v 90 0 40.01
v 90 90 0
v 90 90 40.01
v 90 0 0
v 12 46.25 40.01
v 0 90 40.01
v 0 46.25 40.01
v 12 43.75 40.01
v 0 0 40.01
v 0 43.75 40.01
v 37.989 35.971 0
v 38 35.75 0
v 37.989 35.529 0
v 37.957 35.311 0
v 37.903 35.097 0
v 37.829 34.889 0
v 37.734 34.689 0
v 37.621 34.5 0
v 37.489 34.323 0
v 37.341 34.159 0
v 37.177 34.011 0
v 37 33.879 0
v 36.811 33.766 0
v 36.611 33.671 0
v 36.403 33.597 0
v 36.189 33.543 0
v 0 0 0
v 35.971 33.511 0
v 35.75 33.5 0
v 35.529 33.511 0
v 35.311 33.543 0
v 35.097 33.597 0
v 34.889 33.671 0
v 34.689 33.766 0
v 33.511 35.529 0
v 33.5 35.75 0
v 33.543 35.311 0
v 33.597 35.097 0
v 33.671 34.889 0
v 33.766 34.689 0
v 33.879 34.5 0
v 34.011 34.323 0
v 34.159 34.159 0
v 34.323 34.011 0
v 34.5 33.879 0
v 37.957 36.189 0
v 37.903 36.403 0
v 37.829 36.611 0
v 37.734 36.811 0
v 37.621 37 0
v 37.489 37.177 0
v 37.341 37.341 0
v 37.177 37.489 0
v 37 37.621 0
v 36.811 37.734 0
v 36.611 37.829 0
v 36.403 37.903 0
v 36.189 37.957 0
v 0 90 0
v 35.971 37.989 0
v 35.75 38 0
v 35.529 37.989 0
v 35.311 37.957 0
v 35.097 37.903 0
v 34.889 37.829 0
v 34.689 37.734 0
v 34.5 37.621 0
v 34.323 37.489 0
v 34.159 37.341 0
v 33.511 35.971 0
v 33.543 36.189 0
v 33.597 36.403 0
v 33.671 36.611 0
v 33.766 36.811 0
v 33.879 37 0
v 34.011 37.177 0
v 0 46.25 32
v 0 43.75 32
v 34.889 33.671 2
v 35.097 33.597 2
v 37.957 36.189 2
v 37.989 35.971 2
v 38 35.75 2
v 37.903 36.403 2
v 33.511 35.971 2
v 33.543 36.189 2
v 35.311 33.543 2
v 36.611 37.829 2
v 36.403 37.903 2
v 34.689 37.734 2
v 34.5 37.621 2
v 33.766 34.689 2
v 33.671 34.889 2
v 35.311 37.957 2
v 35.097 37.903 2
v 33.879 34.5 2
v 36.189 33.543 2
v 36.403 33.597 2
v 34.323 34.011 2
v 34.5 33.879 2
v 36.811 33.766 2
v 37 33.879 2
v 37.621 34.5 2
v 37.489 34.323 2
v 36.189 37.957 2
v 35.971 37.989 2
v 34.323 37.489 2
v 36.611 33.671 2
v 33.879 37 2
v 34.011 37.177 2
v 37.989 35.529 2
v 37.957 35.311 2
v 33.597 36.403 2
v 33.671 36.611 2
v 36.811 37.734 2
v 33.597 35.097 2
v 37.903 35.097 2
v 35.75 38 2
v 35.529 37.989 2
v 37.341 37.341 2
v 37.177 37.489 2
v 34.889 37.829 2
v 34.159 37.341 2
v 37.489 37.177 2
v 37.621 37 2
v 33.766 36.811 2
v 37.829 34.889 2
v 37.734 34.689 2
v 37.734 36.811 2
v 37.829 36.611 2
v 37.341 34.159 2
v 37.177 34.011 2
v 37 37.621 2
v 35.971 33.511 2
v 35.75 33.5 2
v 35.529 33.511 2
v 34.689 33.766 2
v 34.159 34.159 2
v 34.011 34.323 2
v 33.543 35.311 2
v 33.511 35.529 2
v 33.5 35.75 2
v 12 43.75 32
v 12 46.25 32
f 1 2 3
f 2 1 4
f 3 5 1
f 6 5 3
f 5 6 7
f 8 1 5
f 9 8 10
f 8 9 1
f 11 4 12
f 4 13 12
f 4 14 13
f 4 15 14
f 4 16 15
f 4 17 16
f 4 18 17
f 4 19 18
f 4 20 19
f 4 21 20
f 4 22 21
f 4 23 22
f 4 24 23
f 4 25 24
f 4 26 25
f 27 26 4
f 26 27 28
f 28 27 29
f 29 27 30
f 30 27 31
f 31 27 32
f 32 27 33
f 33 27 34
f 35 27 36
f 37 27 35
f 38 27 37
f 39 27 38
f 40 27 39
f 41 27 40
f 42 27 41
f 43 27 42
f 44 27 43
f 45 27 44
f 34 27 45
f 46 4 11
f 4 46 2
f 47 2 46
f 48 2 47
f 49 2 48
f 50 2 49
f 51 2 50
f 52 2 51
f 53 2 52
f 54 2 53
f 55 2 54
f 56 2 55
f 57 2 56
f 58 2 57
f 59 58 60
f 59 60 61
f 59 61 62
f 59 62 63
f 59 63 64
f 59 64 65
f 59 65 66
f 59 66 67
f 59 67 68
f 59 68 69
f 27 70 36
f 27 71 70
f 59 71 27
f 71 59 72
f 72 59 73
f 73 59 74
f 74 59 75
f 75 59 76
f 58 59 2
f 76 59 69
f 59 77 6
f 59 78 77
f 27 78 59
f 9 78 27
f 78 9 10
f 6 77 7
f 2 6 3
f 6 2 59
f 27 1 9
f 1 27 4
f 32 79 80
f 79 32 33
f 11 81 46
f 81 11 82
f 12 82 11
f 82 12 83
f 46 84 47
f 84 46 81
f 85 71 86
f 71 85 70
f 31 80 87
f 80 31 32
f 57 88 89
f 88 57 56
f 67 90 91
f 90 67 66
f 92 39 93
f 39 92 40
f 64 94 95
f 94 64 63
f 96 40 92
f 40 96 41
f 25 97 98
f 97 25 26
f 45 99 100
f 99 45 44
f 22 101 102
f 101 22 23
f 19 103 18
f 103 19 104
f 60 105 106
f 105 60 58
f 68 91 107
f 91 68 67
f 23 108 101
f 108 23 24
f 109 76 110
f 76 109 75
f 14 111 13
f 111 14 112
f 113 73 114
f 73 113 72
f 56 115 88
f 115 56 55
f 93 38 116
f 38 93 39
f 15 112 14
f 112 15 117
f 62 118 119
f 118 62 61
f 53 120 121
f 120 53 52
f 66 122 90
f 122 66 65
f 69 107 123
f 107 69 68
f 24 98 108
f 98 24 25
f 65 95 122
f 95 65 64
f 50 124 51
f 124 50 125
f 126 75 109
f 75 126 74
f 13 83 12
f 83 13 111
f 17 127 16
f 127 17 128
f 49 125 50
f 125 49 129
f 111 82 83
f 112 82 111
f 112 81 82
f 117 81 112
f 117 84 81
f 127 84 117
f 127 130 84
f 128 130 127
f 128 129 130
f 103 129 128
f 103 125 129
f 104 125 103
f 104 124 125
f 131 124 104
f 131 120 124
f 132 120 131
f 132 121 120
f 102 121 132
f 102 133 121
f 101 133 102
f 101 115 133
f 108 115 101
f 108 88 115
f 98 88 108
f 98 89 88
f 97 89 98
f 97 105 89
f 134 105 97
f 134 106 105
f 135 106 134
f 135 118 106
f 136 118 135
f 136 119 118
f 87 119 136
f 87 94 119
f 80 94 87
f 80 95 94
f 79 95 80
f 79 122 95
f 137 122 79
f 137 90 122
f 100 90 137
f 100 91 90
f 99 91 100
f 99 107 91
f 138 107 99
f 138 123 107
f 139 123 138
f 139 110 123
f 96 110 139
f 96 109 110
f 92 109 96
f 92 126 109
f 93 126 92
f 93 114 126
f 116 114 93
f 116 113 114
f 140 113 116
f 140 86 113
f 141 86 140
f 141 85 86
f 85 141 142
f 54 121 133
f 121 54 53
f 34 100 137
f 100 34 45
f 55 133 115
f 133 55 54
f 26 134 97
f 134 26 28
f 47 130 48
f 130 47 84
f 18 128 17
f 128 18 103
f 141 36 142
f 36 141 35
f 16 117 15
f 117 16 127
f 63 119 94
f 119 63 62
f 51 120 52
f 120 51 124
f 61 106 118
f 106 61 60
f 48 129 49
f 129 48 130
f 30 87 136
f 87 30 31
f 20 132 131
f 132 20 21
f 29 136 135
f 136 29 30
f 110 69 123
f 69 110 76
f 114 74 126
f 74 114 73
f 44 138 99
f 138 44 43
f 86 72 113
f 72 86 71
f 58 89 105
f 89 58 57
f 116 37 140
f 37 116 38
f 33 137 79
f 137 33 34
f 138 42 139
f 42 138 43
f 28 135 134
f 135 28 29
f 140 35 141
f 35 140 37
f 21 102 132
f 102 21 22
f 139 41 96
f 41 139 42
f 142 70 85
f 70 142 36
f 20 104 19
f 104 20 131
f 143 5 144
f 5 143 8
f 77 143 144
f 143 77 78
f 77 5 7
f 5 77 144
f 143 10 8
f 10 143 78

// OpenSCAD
// DIY Magnetic Stirrer Housing - based on an 80mm PC fan.
// Orientation: Top plate on bed (z=0), walls rising to z=40.
// Outer dimensions: 90 x 90 mm.

$fn = 64;

// Dimensions
outer_w = 90;
outer_h = 90;
top_thk = 2;
wall_thk = 2.5;
wall_h   = 40; // Total height from bed to open top
notch_w  = 12;
notch_d  = 8;  // Depth from open edge (z=32) down to z=24

// Fan mounting hole pattern
mounting_sq = 71.5;
mounting_hole = 4.5;

// Derived positions
half_outer = outer_w / 2;
half_mount = mounting_sq / 2;
z_open     = wall_h; // The open top is at z = 40

// Main body: Top plate + 4 walls
module housing_body() {
    // Start with the solid block including walls
    translate([0, 0, 0]) 
        cube([outer_w, outer_h, wall_h + 0.01]); // +0.01 to ensure solid union

    // Cut the internal cavity
    // Cavity starts at z = top_thk and goes up to z_open
    translate([0, 0, top_thk]) 
        cube([outer_w - 2*wall_thk, outer_h - 2*wall_thk, wall_h - top_thk + 0.01]);
}

// Screw holes in the top plate
module screw_holes() {
    for (i = [0 : 3]) {
        // Calculate X and Y positions for the 4 corners of the 71.5mm square
        // Pattern is centred on the 90mm plate
        x_pos = (i < 2) ? (-half_mount) : (half_mount);
        y_pos = (i < 1) ? (-half_mount) : (half_mount);
        
        translate([x_pos, y_pos, 0]) {
            // Cut through the top plate only (z=0 to z=top_thk)
            translate([0, 0, -1]) 
                cylinder(h = top_thk + 1, d = mounting_hole);
        }
    }
}

// Cable notch in one wall (let's say the front wall, facing +Y)
// Notch is 12mm wide, centred along the wall, 8mm deep from the open edge (z=40)
module cable_notch() {
    // Position: Centred on the wall (x=0), at the top edge (y = half_outer - wall_thk/2)
    // Actually, the wall is at y = half_outer - wall_thk/2 to y = half_outer + wall_thk/2?
    // No, the outer box is 90x90. The wall is on the perimeter.
    // Let's assume the notch is on the wall at y = half_outer - wall_thk/2 (front face)
    // Wait, if the box is 90x90, the walls are at x=+-45 and y=+-45.
    // Let's put the notch on the wall at y = 45 - 1.25 = 43.75?
    // No, the wall thickness is 2.5. The inner face is at 43.75, outer at 46.25.
    // The notch should be on the inner face or outer face? Usually inner for cable access.
    // Let's cut it from the outer face inwards? Or just cut a slot in the wall volume.
    // "reaching 8 mm down from the open edge". Open edge is at z=40.
    // So notch goes from z=40 down to z=32.
    
    // Position: x=0, y = half_outer - wall_thk/2 (inner face of front wall)
    // Actually, let's just define the wall location clearly.
    // Wall is between y = 43.75 and y = 46.25.
    // Notch is in the wall. Let's center it on the inner face (y=43.75) for easy wiring.
    
    translate([0, half_outer - wall_thk/2, 0]) {
        // Cut a rectangular prism
        // Width: 12mm
        // Height (Z): 8mm (from z=32 to z=40)
        // Depth (Y): wall_thk (to cut through the whole wall)
        translate([0, 0, 32]) 
            cube([notch_w, wall_thk, notch_d + 0.01]);
    }
}

// Combine everything
difference() {
    union() {
        housing_body();
        // Add the screw holes as negative space in the top plate
        // We can't easily do "add holes" in a union, so we do the holes in the main difference block
    }
    
    // 1. Screw holes
    screw_holes();
    
    // 2. Cable notch
    cable_notch();
}
